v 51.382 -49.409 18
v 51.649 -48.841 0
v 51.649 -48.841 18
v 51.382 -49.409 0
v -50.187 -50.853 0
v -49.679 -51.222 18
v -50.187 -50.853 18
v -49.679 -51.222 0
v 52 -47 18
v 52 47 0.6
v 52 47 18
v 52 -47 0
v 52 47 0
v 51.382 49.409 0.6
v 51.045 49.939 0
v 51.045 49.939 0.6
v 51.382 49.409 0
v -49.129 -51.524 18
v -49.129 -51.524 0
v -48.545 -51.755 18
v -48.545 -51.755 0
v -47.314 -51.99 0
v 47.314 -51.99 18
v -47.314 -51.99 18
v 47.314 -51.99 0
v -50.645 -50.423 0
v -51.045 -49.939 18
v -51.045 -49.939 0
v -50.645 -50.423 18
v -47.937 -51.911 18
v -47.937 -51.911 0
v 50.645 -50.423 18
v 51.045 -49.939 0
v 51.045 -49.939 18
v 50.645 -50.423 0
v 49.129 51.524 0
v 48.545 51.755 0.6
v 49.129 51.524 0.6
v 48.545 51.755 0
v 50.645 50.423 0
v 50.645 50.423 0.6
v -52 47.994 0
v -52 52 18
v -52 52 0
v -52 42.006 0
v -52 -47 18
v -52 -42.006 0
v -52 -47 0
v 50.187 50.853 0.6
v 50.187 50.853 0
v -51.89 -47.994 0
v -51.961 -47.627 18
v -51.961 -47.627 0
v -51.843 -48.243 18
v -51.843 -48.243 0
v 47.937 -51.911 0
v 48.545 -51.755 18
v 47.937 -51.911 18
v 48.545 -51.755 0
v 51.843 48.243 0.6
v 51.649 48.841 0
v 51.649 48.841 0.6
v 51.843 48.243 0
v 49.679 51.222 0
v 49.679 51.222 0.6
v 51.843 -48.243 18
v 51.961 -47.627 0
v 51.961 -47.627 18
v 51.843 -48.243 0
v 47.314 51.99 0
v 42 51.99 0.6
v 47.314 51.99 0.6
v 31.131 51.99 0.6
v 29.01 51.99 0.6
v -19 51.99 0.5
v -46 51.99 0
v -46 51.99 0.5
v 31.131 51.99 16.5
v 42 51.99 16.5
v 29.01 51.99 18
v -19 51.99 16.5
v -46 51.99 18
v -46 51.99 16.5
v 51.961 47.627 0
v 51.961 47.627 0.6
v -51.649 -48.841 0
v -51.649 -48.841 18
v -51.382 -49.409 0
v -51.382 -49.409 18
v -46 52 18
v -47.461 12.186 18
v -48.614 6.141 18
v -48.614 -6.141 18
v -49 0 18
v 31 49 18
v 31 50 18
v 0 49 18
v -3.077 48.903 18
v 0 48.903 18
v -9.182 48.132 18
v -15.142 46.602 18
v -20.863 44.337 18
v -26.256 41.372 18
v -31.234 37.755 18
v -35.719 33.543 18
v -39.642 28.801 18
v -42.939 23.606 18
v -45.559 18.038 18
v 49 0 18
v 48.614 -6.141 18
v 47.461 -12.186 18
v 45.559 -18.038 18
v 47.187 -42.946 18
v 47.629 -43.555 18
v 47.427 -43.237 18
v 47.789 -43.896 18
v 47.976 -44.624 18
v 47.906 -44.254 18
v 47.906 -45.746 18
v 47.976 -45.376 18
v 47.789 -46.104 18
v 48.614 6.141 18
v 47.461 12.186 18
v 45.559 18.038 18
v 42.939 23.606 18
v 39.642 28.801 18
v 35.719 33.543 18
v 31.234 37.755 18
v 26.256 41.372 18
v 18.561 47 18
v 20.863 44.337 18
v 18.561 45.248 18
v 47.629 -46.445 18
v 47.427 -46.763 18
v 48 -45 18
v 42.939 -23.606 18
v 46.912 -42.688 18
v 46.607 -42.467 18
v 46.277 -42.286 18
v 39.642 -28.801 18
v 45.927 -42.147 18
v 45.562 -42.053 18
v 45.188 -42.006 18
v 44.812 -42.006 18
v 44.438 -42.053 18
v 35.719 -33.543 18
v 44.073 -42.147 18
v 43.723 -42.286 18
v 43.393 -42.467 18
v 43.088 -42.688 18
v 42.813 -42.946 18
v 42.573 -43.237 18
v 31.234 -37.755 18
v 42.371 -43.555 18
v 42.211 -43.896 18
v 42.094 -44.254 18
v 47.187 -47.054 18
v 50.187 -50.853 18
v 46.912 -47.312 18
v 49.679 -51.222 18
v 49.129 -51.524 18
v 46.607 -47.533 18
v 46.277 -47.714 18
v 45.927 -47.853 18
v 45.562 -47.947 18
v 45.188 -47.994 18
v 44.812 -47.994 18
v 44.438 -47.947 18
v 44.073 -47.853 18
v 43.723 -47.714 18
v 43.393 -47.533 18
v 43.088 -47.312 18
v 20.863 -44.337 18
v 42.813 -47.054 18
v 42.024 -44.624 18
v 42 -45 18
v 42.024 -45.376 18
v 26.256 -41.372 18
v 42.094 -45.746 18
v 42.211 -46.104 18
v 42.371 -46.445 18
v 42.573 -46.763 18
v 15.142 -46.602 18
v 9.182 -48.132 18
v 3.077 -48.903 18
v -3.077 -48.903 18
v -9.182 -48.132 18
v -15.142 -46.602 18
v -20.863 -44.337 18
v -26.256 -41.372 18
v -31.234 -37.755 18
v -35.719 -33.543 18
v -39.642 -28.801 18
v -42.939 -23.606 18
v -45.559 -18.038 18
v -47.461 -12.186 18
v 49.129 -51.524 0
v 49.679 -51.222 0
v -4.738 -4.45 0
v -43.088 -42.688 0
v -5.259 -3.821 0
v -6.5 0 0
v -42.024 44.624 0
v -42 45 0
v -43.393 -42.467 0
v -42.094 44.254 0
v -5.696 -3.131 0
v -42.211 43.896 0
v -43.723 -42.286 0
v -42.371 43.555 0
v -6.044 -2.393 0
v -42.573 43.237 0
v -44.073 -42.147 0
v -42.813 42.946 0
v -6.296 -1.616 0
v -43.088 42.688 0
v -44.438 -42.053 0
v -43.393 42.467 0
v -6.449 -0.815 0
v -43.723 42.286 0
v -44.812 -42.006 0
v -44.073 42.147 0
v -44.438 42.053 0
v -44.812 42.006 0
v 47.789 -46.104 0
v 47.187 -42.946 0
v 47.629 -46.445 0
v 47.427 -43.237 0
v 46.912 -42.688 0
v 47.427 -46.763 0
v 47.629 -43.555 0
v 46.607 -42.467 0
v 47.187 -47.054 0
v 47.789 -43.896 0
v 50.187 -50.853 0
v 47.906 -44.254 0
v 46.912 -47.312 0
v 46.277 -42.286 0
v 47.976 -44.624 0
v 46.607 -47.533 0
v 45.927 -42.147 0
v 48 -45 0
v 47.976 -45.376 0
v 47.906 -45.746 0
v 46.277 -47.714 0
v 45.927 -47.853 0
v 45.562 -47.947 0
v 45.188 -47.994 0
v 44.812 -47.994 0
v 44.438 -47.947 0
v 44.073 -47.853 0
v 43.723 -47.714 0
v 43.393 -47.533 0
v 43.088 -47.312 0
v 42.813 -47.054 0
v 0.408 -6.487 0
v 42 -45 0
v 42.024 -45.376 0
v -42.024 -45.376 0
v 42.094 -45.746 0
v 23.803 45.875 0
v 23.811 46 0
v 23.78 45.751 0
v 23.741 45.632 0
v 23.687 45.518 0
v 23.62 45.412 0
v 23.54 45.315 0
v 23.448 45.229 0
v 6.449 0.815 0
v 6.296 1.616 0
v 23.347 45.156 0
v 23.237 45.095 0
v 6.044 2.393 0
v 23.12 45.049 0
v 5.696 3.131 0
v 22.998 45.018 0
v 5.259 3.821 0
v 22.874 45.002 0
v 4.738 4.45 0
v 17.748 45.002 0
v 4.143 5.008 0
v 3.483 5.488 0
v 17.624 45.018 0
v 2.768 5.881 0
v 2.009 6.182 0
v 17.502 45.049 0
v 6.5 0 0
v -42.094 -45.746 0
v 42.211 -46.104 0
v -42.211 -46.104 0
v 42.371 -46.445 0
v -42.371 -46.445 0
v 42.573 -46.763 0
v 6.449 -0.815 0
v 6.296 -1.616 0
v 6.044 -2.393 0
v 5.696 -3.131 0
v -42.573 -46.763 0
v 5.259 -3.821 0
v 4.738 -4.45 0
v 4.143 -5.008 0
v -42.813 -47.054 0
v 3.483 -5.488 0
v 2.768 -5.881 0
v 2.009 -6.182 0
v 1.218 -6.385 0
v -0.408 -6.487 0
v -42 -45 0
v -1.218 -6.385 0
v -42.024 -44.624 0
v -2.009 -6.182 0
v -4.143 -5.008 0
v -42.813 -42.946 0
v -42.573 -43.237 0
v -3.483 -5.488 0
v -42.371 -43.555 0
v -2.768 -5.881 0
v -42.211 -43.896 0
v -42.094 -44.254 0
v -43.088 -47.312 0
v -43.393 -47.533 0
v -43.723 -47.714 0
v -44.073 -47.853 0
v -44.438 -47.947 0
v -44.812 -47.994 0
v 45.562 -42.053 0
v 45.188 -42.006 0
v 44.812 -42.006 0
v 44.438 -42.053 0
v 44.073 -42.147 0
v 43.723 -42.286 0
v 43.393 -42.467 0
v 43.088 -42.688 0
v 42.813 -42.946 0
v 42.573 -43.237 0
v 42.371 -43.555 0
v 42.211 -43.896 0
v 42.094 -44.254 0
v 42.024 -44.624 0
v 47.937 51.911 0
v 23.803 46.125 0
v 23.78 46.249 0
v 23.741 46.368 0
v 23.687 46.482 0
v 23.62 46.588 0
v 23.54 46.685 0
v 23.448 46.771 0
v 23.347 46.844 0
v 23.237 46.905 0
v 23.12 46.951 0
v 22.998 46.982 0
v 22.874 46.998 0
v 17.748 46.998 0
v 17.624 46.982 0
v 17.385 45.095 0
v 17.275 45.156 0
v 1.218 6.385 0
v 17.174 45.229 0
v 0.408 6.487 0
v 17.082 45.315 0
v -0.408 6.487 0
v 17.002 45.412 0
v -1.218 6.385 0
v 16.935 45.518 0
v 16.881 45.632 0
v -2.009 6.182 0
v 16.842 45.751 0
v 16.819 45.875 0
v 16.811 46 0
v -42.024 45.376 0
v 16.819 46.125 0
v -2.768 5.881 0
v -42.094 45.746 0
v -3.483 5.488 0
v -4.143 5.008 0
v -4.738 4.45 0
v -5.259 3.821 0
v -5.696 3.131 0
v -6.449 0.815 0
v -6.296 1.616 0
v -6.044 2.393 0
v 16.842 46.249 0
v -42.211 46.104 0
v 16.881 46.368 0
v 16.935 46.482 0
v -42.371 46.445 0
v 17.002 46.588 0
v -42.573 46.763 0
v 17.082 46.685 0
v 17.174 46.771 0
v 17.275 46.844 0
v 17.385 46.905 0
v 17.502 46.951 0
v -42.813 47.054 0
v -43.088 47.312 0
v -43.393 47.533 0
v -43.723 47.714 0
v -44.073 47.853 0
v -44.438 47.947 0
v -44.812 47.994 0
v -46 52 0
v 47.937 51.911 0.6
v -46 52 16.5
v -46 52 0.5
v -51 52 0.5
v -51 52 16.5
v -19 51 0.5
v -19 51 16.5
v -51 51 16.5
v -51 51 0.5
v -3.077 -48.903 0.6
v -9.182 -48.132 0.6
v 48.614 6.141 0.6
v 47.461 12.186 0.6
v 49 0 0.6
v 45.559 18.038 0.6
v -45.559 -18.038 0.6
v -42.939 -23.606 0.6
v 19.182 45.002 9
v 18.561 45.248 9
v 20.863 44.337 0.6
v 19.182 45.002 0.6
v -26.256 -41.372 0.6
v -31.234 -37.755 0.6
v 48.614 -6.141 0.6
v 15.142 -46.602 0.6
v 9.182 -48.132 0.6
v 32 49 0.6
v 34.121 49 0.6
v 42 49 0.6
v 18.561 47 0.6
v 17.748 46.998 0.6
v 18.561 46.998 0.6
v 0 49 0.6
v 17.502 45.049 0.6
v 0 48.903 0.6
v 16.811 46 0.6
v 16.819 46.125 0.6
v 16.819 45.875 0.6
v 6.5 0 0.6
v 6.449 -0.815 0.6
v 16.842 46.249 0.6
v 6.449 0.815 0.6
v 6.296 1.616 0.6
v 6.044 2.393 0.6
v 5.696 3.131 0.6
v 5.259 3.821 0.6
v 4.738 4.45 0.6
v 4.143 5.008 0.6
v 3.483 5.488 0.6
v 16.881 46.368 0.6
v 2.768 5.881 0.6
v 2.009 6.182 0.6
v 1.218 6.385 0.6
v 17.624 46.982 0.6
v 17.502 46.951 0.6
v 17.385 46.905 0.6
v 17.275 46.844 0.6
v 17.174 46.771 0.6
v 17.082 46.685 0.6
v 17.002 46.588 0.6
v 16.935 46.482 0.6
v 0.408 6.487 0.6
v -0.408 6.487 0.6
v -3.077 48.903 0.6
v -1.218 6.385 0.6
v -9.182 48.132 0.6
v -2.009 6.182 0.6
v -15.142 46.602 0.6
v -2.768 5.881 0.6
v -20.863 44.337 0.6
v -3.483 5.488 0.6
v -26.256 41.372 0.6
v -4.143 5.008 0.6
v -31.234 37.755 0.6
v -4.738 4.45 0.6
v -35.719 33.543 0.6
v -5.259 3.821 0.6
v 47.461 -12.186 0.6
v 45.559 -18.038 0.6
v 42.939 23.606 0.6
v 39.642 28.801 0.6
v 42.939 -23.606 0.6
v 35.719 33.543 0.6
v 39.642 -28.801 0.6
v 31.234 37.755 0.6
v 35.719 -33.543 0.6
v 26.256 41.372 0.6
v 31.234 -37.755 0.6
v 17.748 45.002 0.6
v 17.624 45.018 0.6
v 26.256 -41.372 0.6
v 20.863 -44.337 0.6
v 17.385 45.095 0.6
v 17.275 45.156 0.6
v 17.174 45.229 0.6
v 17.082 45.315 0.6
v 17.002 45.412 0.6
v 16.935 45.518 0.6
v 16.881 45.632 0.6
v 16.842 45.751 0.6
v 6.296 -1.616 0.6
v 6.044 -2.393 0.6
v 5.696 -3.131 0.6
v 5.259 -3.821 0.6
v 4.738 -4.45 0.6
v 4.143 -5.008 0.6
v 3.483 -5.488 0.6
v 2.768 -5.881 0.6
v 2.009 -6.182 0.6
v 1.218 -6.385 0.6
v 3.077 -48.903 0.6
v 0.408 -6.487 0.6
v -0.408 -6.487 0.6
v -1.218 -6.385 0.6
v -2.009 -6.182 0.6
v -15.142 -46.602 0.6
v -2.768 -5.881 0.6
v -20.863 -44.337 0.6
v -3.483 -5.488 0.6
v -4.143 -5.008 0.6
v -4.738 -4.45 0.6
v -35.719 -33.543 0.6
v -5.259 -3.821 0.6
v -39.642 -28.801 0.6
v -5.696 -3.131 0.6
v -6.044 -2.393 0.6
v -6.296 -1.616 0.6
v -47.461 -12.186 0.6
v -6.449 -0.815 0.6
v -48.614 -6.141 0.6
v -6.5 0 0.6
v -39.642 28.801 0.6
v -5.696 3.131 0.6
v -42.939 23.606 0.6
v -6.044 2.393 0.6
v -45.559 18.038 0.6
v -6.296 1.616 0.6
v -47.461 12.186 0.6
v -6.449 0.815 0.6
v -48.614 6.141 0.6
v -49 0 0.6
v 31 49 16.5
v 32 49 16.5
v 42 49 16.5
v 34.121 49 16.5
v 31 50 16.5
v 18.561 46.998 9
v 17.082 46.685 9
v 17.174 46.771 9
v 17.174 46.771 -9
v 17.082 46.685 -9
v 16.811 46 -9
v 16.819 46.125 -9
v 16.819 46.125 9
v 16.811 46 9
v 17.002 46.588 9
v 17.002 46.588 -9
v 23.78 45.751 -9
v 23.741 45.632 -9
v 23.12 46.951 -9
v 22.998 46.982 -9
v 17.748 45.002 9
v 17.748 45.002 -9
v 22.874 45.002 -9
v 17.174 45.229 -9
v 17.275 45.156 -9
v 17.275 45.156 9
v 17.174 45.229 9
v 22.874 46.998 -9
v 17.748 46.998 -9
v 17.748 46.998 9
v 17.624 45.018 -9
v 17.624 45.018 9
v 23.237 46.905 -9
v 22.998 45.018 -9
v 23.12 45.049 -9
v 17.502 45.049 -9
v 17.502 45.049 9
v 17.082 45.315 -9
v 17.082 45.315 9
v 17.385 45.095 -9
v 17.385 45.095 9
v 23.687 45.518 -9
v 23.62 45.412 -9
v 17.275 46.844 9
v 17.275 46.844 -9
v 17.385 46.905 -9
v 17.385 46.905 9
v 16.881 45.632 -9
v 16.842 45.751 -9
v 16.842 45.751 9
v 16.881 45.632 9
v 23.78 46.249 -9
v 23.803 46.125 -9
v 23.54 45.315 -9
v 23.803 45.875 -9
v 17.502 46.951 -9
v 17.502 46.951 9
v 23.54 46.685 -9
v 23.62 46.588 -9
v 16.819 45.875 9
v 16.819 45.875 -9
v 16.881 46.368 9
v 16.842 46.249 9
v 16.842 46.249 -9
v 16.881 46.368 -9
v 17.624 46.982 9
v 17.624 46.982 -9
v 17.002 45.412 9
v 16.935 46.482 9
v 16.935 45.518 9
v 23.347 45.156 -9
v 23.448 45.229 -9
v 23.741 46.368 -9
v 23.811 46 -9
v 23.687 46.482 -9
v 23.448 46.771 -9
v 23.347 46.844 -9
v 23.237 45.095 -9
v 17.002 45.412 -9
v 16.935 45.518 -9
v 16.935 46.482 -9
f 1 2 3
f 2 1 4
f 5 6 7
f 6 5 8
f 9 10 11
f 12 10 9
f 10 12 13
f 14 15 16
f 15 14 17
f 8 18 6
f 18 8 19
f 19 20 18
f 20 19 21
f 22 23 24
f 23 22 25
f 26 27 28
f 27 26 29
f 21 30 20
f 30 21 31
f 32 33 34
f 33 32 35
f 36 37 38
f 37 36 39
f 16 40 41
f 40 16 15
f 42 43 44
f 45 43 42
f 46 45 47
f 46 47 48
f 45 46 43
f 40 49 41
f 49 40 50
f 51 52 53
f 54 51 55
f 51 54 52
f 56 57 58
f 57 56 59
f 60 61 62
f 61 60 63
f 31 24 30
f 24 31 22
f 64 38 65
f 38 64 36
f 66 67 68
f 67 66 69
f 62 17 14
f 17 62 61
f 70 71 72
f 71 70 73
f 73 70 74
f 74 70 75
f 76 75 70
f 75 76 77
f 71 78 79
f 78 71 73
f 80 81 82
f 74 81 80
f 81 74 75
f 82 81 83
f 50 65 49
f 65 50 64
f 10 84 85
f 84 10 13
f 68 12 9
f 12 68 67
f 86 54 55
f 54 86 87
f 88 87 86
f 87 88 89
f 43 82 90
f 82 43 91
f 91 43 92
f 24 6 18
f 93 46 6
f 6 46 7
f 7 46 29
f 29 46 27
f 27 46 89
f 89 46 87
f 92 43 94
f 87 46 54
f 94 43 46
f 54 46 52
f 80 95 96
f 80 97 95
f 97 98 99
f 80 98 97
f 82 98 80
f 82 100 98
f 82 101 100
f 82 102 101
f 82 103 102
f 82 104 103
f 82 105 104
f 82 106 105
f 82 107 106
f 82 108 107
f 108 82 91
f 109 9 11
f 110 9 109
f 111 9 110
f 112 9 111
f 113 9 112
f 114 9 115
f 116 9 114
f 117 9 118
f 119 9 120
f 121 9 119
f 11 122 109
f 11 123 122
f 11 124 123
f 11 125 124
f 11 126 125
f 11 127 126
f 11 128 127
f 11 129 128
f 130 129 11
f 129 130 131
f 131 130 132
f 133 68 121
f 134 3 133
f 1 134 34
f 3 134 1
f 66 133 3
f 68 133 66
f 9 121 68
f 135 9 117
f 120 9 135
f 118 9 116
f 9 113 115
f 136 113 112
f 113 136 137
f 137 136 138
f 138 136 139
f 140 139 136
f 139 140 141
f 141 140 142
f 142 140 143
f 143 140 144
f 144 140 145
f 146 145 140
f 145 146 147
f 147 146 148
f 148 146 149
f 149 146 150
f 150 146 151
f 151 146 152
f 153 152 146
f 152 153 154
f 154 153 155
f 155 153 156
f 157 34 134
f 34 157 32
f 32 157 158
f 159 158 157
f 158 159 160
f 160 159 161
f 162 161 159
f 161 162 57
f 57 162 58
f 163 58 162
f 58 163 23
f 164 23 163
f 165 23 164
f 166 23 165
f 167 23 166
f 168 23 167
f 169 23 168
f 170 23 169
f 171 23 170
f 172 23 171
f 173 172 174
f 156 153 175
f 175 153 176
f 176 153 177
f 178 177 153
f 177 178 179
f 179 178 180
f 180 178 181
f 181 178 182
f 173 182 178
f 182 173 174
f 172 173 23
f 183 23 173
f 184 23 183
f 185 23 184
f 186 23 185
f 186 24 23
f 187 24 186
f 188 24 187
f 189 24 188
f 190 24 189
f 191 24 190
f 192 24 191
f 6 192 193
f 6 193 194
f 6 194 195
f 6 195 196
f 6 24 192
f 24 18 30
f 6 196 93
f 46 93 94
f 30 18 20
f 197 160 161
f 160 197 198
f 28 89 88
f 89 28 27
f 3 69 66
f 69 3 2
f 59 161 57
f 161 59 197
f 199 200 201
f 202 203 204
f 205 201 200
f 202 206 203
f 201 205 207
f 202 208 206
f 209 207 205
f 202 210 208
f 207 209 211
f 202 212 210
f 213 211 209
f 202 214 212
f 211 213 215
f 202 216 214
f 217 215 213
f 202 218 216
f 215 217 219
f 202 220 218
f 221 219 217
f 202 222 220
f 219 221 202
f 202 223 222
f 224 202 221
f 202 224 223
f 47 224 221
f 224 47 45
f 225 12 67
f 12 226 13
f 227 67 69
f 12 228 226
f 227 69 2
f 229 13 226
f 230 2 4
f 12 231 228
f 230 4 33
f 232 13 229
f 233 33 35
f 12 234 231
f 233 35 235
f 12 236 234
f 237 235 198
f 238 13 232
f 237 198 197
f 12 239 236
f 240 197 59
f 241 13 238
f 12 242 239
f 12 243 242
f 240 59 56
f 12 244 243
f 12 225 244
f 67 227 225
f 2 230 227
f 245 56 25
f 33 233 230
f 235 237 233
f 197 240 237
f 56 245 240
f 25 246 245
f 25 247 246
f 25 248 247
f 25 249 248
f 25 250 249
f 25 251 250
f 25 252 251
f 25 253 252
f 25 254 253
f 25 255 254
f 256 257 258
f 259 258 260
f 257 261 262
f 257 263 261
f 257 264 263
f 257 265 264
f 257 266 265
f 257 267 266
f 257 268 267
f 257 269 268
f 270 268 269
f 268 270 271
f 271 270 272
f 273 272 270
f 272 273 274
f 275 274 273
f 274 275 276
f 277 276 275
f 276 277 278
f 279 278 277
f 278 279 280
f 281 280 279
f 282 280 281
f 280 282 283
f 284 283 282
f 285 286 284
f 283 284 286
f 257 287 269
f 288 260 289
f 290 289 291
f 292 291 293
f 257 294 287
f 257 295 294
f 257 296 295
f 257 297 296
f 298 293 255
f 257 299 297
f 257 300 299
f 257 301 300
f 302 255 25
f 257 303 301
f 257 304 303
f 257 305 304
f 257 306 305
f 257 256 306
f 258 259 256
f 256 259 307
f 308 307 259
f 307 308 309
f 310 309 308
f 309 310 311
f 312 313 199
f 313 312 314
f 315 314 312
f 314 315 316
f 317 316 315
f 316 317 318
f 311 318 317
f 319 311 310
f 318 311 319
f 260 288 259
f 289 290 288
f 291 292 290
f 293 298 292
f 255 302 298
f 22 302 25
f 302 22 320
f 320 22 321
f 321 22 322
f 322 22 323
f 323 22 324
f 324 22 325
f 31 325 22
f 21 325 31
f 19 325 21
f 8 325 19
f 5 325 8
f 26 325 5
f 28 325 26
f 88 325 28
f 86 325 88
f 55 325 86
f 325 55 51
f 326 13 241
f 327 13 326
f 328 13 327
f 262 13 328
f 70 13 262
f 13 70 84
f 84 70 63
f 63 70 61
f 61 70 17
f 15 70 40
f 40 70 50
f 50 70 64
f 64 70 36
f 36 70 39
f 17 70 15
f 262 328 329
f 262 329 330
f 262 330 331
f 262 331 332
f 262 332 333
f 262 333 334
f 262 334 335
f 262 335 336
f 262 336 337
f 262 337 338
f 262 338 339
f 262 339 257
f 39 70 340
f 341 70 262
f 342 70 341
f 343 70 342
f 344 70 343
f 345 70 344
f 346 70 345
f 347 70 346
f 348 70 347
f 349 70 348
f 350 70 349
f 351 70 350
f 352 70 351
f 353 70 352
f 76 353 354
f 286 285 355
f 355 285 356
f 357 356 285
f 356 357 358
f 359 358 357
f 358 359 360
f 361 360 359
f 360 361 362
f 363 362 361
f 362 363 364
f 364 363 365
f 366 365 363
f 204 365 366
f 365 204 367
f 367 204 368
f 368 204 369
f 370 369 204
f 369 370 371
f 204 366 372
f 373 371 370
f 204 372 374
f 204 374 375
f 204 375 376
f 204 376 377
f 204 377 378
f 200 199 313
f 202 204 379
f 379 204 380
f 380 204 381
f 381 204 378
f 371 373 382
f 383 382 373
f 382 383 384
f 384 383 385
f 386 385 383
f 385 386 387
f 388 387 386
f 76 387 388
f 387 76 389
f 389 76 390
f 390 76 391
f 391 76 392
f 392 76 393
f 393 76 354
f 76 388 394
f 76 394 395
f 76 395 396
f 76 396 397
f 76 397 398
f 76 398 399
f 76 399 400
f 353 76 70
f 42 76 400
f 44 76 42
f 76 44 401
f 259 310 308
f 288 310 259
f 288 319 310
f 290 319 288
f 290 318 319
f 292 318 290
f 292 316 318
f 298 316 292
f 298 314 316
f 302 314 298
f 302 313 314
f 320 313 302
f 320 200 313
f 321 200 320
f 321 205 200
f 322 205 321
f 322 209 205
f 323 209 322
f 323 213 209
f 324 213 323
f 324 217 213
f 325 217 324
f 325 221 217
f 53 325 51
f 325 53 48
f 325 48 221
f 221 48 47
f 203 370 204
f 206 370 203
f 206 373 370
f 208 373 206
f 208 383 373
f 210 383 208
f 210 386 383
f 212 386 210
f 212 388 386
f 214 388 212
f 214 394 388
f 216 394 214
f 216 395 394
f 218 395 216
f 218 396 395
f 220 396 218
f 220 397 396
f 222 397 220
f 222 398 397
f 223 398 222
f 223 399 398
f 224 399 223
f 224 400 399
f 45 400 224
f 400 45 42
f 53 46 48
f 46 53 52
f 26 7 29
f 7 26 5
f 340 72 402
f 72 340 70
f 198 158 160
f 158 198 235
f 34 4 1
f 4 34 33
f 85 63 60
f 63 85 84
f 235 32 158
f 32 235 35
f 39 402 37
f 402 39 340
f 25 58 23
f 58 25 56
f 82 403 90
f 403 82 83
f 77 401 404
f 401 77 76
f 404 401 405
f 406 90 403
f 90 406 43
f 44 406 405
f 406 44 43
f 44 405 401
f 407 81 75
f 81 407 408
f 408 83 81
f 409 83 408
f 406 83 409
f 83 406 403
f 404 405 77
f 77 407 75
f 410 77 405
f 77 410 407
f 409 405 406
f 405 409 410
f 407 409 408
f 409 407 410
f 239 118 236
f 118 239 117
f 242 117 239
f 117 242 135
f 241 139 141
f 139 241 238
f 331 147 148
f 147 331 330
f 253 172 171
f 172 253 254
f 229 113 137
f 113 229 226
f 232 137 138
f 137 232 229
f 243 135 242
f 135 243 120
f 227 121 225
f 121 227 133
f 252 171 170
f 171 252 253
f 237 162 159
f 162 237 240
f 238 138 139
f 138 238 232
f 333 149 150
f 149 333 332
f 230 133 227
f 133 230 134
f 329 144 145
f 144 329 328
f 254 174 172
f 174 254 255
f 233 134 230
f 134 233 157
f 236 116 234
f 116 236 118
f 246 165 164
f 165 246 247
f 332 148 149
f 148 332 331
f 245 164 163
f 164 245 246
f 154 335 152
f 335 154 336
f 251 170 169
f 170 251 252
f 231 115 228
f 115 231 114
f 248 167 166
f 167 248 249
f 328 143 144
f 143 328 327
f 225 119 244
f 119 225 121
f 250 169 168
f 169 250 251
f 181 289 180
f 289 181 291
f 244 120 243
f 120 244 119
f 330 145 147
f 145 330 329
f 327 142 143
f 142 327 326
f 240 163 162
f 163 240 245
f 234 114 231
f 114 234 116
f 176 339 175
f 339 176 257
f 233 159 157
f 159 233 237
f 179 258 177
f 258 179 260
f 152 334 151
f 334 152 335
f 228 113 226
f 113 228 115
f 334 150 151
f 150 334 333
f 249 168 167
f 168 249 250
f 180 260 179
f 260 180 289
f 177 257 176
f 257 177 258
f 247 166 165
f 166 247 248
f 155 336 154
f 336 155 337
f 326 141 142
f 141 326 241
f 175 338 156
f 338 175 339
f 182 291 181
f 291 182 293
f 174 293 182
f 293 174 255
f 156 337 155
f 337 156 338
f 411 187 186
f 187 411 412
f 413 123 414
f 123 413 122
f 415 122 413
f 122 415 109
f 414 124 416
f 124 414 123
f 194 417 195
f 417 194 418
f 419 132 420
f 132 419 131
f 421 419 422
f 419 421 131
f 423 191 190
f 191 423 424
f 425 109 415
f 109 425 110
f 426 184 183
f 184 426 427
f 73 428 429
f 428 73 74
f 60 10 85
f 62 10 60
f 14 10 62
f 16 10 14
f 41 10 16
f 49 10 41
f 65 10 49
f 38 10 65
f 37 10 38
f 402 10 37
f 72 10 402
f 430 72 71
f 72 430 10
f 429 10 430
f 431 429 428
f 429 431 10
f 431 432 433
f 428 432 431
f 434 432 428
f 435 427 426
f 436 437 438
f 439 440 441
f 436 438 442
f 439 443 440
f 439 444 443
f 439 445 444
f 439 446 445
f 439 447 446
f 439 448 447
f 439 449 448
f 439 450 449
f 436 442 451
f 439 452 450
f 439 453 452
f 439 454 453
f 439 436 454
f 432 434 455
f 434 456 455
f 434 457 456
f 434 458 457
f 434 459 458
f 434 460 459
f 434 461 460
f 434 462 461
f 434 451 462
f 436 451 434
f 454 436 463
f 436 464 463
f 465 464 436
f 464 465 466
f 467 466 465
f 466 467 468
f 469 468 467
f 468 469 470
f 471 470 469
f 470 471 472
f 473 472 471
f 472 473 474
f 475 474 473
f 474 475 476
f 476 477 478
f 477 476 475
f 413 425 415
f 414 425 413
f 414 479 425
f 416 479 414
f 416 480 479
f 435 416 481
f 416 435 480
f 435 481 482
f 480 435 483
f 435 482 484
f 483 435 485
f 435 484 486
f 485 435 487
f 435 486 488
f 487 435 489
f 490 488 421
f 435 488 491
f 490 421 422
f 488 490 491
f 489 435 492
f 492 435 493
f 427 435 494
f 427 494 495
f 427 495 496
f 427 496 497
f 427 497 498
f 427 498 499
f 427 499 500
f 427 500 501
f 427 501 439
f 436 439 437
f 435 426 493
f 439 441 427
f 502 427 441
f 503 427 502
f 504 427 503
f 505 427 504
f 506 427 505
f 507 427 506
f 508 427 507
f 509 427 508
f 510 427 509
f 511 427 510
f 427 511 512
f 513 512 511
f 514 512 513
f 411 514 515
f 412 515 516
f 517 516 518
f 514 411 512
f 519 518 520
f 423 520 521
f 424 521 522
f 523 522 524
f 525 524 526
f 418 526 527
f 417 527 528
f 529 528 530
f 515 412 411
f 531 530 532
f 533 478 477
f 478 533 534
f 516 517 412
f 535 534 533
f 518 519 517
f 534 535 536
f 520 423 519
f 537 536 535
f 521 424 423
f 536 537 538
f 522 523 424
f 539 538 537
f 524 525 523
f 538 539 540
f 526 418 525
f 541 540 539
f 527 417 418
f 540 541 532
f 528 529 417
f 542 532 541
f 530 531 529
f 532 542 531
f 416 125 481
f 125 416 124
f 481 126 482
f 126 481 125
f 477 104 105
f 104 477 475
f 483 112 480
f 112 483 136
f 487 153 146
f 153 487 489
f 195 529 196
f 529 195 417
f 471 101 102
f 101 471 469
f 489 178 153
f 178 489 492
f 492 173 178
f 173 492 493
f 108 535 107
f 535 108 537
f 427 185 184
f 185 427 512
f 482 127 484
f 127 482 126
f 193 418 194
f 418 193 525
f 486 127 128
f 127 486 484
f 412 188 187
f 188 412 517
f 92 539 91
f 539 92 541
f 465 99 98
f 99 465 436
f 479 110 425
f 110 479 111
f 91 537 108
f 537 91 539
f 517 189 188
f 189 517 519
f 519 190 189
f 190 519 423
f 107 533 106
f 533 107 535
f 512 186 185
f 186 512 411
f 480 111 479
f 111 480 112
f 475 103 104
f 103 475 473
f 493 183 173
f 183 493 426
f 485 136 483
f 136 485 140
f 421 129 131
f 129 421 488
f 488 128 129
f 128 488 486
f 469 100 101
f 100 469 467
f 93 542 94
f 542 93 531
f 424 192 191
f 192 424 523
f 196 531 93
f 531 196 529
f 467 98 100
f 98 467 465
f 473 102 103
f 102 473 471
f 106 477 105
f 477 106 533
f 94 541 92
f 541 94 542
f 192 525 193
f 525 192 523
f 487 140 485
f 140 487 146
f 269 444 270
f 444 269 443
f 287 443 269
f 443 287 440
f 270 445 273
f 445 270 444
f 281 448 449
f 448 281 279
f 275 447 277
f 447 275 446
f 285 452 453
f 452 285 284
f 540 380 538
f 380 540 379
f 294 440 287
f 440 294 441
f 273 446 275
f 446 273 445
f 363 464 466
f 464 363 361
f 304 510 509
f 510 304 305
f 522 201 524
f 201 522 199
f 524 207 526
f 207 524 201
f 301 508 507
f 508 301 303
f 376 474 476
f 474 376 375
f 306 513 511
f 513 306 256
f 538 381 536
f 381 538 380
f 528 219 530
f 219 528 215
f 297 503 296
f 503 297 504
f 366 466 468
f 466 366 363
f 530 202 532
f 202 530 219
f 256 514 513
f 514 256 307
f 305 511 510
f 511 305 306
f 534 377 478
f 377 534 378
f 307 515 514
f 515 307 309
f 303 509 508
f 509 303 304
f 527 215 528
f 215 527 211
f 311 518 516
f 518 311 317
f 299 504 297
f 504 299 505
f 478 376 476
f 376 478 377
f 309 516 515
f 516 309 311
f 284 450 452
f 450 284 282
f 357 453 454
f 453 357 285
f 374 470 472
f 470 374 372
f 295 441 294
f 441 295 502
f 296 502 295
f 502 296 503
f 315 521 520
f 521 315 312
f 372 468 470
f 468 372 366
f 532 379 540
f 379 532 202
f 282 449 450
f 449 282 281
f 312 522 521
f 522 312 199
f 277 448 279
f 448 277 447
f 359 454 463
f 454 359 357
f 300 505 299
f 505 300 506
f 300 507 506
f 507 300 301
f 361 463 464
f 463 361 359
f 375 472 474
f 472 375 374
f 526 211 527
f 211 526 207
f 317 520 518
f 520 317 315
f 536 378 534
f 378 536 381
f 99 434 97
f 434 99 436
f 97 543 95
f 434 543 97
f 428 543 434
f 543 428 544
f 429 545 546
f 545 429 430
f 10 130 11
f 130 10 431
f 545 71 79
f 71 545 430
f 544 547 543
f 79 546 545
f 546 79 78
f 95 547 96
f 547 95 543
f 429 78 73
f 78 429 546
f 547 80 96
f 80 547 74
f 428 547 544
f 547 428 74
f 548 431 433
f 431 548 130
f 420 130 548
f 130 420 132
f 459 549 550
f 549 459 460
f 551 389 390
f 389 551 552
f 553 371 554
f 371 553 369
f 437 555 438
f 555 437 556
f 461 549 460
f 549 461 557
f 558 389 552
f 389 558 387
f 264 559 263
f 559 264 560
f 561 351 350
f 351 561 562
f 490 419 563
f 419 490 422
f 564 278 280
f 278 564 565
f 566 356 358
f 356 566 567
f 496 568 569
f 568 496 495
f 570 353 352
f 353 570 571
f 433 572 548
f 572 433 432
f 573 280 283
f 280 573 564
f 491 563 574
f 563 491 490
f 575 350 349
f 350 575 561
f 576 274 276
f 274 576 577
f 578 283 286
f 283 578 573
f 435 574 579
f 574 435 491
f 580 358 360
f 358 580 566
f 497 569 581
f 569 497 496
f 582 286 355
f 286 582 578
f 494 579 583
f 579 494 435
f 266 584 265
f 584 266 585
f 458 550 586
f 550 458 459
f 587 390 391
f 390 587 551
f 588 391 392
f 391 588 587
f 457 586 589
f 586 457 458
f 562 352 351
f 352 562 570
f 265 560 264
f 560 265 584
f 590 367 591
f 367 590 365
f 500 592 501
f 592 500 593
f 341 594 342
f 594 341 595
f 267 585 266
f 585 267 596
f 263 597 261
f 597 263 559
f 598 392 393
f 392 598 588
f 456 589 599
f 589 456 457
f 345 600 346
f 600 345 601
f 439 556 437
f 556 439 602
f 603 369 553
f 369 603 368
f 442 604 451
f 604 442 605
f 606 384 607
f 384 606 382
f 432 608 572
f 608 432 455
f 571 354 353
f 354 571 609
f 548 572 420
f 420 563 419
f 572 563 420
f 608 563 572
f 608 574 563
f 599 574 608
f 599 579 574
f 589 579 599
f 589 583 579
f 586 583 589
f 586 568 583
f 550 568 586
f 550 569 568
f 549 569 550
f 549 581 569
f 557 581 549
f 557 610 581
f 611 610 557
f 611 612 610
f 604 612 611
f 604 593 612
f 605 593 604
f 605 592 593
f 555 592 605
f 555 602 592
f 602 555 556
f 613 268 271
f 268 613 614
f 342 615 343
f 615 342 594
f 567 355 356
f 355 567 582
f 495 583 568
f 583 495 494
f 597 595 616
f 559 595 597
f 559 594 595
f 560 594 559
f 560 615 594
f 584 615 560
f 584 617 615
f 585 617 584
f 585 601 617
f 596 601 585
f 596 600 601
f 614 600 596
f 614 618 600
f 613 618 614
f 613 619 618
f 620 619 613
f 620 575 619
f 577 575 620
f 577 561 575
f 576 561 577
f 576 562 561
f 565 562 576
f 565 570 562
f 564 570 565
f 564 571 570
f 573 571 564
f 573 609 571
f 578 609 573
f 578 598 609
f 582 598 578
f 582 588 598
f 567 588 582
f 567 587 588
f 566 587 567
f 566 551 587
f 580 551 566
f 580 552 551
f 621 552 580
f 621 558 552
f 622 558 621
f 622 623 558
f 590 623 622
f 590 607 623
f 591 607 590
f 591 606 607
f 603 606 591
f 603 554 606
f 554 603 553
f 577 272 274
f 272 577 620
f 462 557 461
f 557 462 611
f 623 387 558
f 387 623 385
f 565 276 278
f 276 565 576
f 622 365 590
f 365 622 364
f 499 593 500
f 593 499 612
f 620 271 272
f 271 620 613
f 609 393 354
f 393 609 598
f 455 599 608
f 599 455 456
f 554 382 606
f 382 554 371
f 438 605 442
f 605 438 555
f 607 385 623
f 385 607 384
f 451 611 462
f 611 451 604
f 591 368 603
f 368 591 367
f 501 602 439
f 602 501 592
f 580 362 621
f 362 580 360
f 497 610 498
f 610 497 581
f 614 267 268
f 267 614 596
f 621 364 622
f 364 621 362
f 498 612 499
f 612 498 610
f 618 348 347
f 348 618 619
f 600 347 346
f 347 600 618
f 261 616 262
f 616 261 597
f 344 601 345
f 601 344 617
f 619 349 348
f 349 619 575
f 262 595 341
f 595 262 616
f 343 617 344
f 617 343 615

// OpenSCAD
$fn = 50;


union() {
	difference() {
		union() {
			hull() {
				translate(v = [-47.0000000000, 47.0000000000, 0]) {
					cylinder(h = 18, r = 5);
				}
				translate(v = [47.0000000000, 47.0000000000, 0]) {
					cylinder(h = 18, r = 5);
				}
				translate(v = [-47.0000000000, -47.0000000000, 0]) {
					cylinder(h = 18, r = 5);
				}
				translate(v = [47.0000000000, -47.0000000000, 0]) {
					cylinder(h = 18, r = 5);
				}
			}
			translate(v = [-52.0000000000, 46.0000000000, 0]) {
				cube(size = [6, 6, 18]);
			}
		}
		union() {
			translate(v = [-52.5000000000, -45.0000000000, -250.0000000000]) {
				rotate(a = [0, 0, 0]) {
					difference() {
						union() {
							hull() {
								translate(v = [7.5000000000, 0, 0]) {
									cylinder(h = 250, r = 3.0000000000, r1 = 3.0000000000, r2 = 3.0000000000);
								}
								translate(v = [-7.5000000000, 0, 0]) {
									cylinder(h = 250, r = 3.0000000000, r1 = 3.0000000000, r2 = 3.0000000000);
								}
							}
						}
						union();
					}
				}
			}
			translate(v = [-52.5000000000, 45.0000000000, -250.0000000000]) {
				rotate(a = [0, 0, 0]) {
					difference() {
						union() {
							hull() {
								translate(v = [7.5000000000, 0, 0]) {
									cylinder(h = 250, r = 3.0000000000, r1 = 3.0000000000, r2 = 3.0000000000);
								}
								translate(v = [-7.5000000000, 0, 0]) {
									cylinder(h = 250, r = 3.0000000000, r1 = 3.0000000000, r2 = 3.0000000000);
								}
							}
						}
						union();
					}
				}
			}
			translate(v = [-51.0000000000, 51.0000000000, 0.5000000000]) {
				cube(size = [32, 1, 16]);
			}
			translate(v = [45.0000000000, -45.0000000000, 0]) {
				cylinder(h = 100, r = 3.0000000000);
			}
			translate(v = [0, 0, 0.6000000000]) {
				cylinder(h = 20.4000000000, r = 49.0000000000);
			}
			translate(v = [0, 0, -9.0000000000]) {
				cylinder(h = 18, r = 6.5000000000);
			}
			translate(v = [0.0000000000, 47.0000000000, 0.6000000000]) {
				cube(size = [52.0000000000, 2, 20.4000000000]);
			}
			translate(v = [42.0000000000, 47.0000000000, 0.6000000000]) {
				cube(size = [10, 5, 20.4000000000]);
			}
			translate(v = [31.0000000000, 47.0000000000, 16.5000000000]) {
				cube(size = [21, 5, 1.5000000000]);
			}
			translate(v = [28.2500000000, 52.7500000000, 0.6000000000]) {
				rotate(a = [0, 0, -45]) {
					cube(size = [7.5000000000, 1.5000000000, 20.4000000000]);
				}
			}
			translate(v = [11.0610000000, 45.0000000000, 0.6000000000]) {
				cube(size = [7.5000000000, 2, 17.4000000000]);
			}
		}
	}
	union() {
		translate(v = [20.3110000000, 46.0000000000, -9.0000000000]) {
			rotate(a = [0, 0, 0]) {
				difference() {
					union() {
						#hull() {
							#translate(v = [2.5000000000, 0, 0]) {
								cylinder(h = 18, r = 1.0000000000, r1 = 1.0000000000, r2 = 1.0000000000);
							}
							#translate(v = [-2.5000000000, 0, 0]) {
								cylinder(h = 18, r = 1.0000000000, r1 = 1.0000000000, r2 = 1.0000000000);
							}
						}
					}
					union();
				}
			}
		}
	}
}
